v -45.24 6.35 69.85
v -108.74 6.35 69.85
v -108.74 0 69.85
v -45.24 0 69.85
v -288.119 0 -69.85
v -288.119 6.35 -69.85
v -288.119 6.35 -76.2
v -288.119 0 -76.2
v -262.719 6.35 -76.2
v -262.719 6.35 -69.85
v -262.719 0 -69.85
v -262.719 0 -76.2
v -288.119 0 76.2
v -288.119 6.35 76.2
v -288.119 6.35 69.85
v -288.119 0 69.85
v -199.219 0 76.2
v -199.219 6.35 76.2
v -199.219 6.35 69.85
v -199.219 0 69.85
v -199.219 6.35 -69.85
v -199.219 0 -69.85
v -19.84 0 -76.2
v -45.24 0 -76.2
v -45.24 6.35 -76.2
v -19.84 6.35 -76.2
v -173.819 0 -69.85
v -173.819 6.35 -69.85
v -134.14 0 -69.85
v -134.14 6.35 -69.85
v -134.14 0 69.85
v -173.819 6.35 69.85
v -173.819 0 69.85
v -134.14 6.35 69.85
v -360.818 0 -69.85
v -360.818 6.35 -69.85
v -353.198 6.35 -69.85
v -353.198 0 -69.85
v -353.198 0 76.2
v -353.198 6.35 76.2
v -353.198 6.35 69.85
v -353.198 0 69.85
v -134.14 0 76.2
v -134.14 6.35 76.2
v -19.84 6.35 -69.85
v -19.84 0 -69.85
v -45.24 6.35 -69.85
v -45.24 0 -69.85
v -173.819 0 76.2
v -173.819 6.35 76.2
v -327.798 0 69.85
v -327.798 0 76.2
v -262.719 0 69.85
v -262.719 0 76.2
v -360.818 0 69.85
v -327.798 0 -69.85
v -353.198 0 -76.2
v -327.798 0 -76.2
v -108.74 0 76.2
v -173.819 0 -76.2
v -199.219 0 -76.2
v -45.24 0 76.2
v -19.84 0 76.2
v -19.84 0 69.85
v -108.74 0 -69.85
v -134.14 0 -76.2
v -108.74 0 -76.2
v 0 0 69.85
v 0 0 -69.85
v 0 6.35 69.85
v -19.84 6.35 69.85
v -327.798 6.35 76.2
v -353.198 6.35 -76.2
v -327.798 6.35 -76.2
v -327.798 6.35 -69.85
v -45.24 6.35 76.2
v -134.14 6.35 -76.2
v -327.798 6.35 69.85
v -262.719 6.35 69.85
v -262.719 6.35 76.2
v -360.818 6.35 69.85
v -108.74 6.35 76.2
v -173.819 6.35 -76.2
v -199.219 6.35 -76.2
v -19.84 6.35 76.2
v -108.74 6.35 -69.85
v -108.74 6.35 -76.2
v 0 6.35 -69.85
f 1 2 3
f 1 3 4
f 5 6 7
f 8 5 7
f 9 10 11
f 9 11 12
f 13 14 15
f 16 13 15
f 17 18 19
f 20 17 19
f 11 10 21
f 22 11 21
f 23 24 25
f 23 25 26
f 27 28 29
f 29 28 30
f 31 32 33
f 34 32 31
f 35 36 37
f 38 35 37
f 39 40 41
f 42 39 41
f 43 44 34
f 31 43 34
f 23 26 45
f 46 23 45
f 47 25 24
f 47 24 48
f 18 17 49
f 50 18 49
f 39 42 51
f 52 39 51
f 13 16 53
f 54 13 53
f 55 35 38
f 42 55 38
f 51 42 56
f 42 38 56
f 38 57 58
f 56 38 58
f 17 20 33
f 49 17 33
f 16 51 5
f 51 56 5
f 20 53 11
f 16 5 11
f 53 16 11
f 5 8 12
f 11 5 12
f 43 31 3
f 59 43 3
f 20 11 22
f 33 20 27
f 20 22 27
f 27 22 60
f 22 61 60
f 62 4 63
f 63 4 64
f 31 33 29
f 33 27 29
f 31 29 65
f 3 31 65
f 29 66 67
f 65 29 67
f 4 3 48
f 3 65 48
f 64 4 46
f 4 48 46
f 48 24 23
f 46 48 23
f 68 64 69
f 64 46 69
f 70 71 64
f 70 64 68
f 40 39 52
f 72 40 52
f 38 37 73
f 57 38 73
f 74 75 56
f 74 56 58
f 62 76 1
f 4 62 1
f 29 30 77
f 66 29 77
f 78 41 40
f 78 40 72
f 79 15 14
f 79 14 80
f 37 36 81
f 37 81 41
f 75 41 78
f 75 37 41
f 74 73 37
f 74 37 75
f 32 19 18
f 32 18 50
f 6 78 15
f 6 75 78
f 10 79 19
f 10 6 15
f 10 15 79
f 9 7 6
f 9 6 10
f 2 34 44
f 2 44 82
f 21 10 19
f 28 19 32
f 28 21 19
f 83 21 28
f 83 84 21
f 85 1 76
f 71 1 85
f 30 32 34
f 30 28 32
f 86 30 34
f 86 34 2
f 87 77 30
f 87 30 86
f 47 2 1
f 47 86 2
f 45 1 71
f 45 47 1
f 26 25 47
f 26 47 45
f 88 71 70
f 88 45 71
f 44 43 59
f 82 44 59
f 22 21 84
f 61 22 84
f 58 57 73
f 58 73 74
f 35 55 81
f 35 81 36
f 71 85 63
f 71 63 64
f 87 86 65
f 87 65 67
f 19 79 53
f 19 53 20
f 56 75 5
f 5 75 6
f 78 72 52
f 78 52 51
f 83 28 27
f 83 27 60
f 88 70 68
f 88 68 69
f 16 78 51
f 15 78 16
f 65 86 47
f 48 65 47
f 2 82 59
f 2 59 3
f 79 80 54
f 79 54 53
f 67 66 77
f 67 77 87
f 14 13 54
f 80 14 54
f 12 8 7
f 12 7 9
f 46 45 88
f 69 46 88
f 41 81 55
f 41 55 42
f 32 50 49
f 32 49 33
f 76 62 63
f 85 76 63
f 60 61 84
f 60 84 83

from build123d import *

# Parameters (mm, degrees)
SKETCH1_W                 = 721.63658441
SKETCH1_H                 = 152.4
BOSS_EXTRUDE1_DEPTH       = 6.35
SKETCH2_W                 = 39.679316882
SKETCH2_H                 = 6.35
SKETCH2_W_2               = 31.750000127
CUT_EXTRUDE1_DEPTH        = 7.35
LPATTERN1_COUNT           = 3
LPATTERN1_PITCH           = 153.979316882
LPATTERN1_COL_COUNT       = 3
LPATTERN1_COL_PITCH       = 153.979316882
MIRROR1_COPY_1_SKETCH_W   = 39.679316882
MIRROR1_COPY_1_SKETCH_H   = 6.35
MIRROR1_COPY_1_SKETCH_W_2 = 31.750000127
MIRROR1_COPY_1_DEPTH      = 7.35
MIRROR1_COPY_2_SKETCH_W   = 39.679316882
MIRROR1_COPY_2_SKETCH_H   = 6.35
MIRROR1_COPY_2_SKETCH_W_2 = 31.750000127
MIRROR1_COPY_2_DEPTH      = 7.35
MIRROR1_COPY_3_SKETCH_W   = 39.679316882
MIRROR1_COPY_3_SKETCH_H   = 6.35
MIRROR1_COPY_3_SKETCH_W_2 = 31.750000127
MIRROR1_COPY_3_DEPTH      = 7.35
MIRROR1_COPY_4_SKETCH_W   = 39.679316882
MIRROR1_COPY_4_SKETCH_H   = 6.35
MIRROR1_COPY_4_SKETCH_W_2 = 31.750000127
MIRROR1_COPY_4_DEPTH      = 7.35
SKETCH4_W                 = 360.818292205
SKETCH4_H                 = 152.4
CUT_EXTRUDE2_DEPTH        = 7.35


with BuildPart() as part:
    # Sketch1 → Boss-Extrude1 (new body)
    with BuildSketch(Plane(origin=(0, 0, 0), x_dir=(1, 0, 0), z_dir=(0, 1, 0))):
        Rectangle(SKETCH1_W, SKETCH1_H)
    extrude(amount=BOSS_EXTRUDE1_DEPTH)

    # Sketch2 → Cut-Extrude1 (cut, through all)
    with BuildSketch(Plane(origin=(0, 6.35, 0), x_dir=(1, 0, 0), z_dir=(0, 1, 0))):
        with Locations((0, -73.025)):
            Rectangle(SKETCH2_W, SKETCH2_H)
        with Locations((-61.114658505, -73.025)):
            Rectangle(SKETCH2_W_2, SKETCH2_H)
        with Locations((61.114658505, -73.025)):
            Rectangle(SKETCH2_W_2, SKETCH2_H)
    cut_extrude1 = extrude(amount=-CUT_EXTRUDE1_DEPTH, mode=Mode.SUBTRACT)

    # LPattern1: Cut-Extrude1 ×3
    with Locations(*[(i * LPATTERN1_PITCH, 0, 0) for i in range(1, LPATTERN1_COUNT)]):
        add(cut_extrude1, mode=Mode.SUBTRACT)

    # LPattern1 col: Cut-Extrude1 ×3
    with Locations(*[(-i * LPATTERN1_COL_PITCH, 0, 0) for i in range(1, LPATTERN1_COL_COUNT)]):
        add(cut_extrude1, mode=Mode.SUBTRACT)

    # Mirror1: Cut-Extrude1 across plane
    add(cut_extrude1.mirror(Plane.XY), mode=Mode.SUBTRACT)

    # Mirror1 copy 1 sketch → Mirror1 copy 1 (cut, through all)
    with BuildSketch(Plane(origin=(153.979316882, 6.35, 0), x_dir=(1, 0, 0), z_dir=(0, 1, 0))):
        with Locations((0, 73.025)):
            Rectangle(MIRROR1_COPY_1_SKETCH_W, MIRROR1_COPY_1_SKETCH_H)
        with Locations((-61.114658505, 73.025)):
            Rectangle(MIRROR1_COPY_1_SKETCH_W_2, MIRROR1_COPY_1_SKETCH_H)
        with Locations((61.114658505, 73.025)):
            Rectangle(MIRROR1_COPY_1_SKETCH_W_2, MIRROR1_COPY_1_SKETCH_H)
    extrude(amount=-MIRROR1_COPY_1_DEPTH, mode=Mode.SUBTRACT)

    # Mirror1 copy 2 sketch → Mirror1 copy 2 (cut, through all)
    with BuildSketch(Plane(origin=(307.958633764, 6.35, 0), x_dir=(1, 0, 0), z_dir=(0, 1, 0))):
        with Locations((0, 73.025)):
            Rectangle(MIRROR1_COPY_2_SKETCH_W, MIRROR1_COPY_2_SKETCH_H)
        with Locations((-61.114658505, 73.025)):
            Rectangle(MIRROR1_COPY_2_SKETCH_W_2, MIRROR1_COPY_2_SKETCH_H)
        with Locations((61.114658505, 73.025)):
            Rectangle(MIRROR1_COPY_2_SKETCH_W_2, MIRROR1_COPY_2_SKETCH_H)
    extrude(amount=-MIRROR1_COPY_2_DEPTH, mode=Mode.SUBTRACT)

    # Mirror1 copy 3 sketch → Mirror1 copy 3 (cut, through all)
    with BuildSketch(Plane(origin=(-153.979316882, 6.35, 0), x_dir=(1, 0, 0), z_dir=(0, 1, 0))):
        with Locations((0, 73.025)):
            Rectangle(MIRROR1_COPY_3_SKETCH_W, MIRROR1_COPY_3_SKETCH_H)
        with Locations((-61.114658505, 73.025)):
            Rectangle(MIRROR1_COPY_3_SKETCH_W_2, MIRROR1_COPY_3_SKETCH_H)
        with Locations((61.114658505, 73.025)):
            Rectangle(MIRROR1_COPY_3_SKETCH_W_2, MIRROR1_COPY_3_SKETCH_H)
    extrude(amount=-MIRROR1_COPY_3_DEPTH, mode=Mode.SUBTRACT)

    # Mirror1 copy 4 sketch → Mirror1 copy 4 (cut, through all)
    with BuildSketch(Plane(origin=(-307.958633764, 6.35, 0), x_dir=(1, 0, 0), z_dir=(0, 1, 0))):
        with Locations((0, 73.025)):
            Rectangle(MIRROR1_COPY_4_SKETCH_W, MIRROR1_COPY_4_SKETCH_H)
        with Locations((-61.114658505, 73.025)):
            Rectangle(MIRROR1_COPY_4_SKETCH_W_2, MIRROR1_COPY_4_SKETCH_H)
        with Locations((61.114658505, 73.025)):
            Rectangle(MIRROR1_COPY_4_SKETCH_W_2, MIRROR1_COPY_4_SKETCH_H)
    extrude(amount=-MIRROR1_COPY_4_DEPTH, mode=Mode.SUBTRACT)

    # Sketch4 → Cut-Extrude2 (cut, through all)
    with BuildSketch(Plane(origin=(0, 6.35, 0), x_dir=(1, 0, 0), z_dir=(0, 1, 0))):
        with Locations((180.409146103, 0)):
            Rectangle(SKETCH4_W, SKETCH4_H)
    extrude(amount=-CUT_EXTRUDE2_DEPTH, mode=Mode.SUBTRACT)


solid = part.part
